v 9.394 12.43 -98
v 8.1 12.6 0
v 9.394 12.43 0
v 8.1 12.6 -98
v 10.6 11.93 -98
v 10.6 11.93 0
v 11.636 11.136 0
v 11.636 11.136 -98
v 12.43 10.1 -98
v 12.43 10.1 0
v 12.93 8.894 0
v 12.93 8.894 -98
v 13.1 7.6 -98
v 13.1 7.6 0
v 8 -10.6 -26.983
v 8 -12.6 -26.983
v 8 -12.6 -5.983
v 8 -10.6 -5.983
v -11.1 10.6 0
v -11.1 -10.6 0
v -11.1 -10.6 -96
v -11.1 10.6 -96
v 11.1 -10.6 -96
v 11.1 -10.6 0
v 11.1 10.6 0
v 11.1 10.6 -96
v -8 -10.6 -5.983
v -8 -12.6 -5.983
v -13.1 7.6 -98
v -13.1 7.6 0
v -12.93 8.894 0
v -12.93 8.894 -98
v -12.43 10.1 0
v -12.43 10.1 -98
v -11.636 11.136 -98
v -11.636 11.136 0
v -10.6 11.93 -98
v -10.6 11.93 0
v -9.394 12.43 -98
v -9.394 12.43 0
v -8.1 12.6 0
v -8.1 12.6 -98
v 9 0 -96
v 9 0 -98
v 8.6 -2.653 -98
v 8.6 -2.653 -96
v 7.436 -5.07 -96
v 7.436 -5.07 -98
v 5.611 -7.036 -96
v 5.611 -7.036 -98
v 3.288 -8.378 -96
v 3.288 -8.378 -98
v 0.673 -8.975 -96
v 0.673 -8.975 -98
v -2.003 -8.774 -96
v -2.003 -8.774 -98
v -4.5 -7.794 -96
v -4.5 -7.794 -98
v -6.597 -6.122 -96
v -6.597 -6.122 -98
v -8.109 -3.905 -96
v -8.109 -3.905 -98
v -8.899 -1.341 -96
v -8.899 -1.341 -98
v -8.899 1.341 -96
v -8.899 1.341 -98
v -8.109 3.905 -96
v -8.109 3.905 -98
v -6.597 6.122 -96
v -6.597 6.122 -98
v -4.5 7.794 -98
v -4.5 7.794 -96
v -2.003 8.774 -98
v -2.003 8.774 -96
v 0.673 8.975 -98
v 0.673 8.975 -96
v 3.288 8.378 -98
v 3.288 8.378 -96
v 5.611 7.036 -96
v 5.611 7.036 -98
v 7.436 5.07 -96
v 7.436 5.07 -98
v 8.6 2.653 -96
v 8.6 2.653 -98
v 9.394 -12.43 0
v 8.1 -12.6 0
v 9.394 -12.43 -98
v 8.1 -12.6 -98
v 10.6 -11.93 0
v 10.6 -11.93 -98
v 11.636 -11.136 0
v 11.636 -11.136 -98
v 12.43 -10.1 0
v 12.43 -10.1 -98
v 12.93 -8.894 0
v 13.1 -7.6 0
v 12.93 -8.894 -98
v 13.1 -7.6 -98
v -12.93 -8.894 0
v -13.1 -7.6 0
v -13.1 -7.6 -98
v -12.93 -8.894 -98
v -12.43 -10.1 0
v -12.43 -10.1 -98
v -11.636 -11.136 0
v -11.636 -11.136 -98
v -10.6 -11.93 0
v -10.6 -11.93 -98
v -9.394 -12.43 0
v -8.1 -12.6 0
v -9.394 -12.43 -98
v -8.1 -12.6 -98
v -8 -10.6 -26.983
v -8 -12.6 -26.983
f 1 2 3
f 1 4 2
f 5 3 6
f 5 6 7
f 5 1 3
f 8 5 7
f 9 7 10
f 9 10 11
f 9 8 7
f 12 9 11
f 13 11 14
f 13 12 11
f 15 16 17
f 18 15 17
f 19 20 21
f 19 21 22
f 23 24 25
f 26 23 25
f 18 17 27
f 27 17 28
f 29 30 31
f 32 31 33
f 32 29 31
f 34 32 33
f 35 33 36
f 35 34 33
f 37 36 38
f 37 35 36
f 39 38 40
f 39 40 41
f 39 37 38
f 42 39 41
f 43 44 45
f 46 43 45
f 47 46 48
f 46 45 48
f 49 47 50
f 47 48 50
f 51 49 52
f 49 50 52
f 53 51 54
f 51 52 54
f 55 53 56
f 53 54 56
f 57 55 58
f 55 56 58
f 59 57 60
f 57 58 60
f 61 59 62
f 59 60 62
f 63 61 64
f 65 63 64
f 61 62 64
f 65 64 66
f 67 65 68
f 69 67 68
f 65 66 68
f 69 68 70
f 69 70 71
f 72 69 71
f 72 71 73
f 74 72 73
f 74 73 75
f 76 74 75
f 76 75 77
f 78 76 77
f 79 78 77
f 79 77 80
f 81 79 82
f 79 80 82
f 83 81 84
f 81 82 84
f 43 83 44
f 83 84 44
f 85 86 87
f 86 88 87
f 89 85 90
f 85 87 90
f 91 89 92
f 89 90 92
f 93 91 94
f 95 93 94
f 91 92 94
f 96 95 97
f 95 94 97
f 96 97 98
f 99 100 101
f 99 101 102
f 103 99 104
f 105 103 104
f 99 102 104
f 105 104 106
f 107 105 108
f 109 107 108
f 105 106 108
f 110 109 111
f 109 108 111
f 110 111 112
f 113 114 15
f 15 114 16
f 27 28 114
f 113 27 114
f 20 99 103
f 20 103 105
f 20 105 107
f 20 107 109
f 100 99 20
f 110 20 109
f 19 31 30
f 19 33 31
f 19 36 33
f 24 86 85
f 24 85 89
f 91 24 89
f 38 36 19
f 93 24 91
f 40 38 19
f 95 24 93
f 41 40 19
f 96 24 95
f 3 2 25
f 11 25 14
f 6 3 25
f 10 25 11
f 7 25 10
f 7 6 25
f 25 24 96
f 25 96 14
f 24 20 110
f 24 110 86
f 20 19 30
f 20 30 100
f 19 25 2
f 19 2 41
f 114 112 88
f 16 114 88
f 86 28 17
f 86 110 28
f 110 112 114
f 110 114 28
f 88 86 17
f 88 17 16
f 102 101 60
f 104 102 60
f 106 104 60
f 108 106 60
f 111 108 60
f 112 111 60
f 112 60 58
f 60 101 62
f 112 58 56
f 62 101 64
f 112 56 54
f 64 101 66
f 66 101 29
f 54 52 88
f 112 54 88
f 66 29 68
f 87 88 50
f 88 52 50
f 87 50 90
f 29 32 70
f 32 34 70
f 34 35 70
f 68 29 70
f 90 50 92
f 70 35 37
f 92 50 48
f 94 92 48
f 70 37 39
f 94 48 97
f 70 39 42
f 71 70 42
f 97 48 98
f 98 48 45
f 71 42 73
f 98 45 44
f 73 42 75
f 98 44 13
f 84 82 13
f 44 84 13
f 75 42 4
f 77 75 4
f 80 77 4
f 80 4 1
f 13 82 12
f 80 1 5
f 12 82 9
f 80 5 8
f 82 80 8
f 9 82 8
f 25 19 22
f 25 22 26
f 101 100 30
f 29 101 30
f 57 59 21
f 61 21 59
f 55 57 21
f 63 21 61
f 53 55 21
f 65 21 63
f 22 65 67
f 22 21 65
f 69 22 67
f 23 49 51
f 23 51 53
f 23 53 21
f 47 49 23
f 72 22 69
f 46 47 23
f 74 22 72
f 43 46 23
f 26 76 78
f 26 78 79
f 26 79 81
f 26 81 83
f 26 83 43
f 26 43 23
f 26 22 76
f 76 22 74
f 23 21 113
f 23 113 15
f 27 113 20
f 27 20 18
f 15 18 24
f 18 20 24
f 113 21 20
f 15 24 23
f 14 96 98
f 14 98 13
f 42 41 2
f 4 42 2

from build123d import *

# Parameters (mm, degrees)
F0_W     = 26.2
F0_H     = 25.2
F1_DEPTH = 98
F2_T     = -2
F3_R     = 9
F4_DEPTH = 2
F7_DEPTH = 2
F8_R     = 5


with BuildPart() as f1:
    # F0 (on Top) → F1 (new body)
    with BuildSketch(Plane.XY):
        Rectangle(F0_W, F0_H)
    extrude(amount=-F1_DEPTH)

    # F2
    f2_openings = [f1.faces().sort_by_distance(p)[0] for p in [
        (0, 0, 0),
    ]]
    offset(amount=F2_T, openings=f2_openings)

    # F3 (on face) → F4 (cut)
    with BuildSketch(Plane(origin=(0, 0, -98), x_dir=(1, 0, 0), z_dir=(0, 0, -1))):
        Circle(F3_R)
    extrude(amount=-F4_DEPTH, mode=Mode.SUBTRACT)

    # F6 (on face) → F7 (cut)
    with BuildSketch(Plane.XZ.offset(12.6)):
        Polygon((-8, -26.982739), (8, -26.982739), (8, -5.982739), (0, -5.982739), (-8, -5.982739), align=None)
    extrude(amount=-F7_DEPTH, mode=Mode.SUBTRACT)

    # F8
    f8_edges = [f1.edges().sort_by_distance(p)[0] for p in [
        (13.1, -12.6, -49),
        (-13.1, -12.6, -49),
        (-13.1, 12.6, -49),
        (13.1, 12.6, -49),
    ]]
    fillet(f8_edges, radius=F8_R)


solid = f1.part
